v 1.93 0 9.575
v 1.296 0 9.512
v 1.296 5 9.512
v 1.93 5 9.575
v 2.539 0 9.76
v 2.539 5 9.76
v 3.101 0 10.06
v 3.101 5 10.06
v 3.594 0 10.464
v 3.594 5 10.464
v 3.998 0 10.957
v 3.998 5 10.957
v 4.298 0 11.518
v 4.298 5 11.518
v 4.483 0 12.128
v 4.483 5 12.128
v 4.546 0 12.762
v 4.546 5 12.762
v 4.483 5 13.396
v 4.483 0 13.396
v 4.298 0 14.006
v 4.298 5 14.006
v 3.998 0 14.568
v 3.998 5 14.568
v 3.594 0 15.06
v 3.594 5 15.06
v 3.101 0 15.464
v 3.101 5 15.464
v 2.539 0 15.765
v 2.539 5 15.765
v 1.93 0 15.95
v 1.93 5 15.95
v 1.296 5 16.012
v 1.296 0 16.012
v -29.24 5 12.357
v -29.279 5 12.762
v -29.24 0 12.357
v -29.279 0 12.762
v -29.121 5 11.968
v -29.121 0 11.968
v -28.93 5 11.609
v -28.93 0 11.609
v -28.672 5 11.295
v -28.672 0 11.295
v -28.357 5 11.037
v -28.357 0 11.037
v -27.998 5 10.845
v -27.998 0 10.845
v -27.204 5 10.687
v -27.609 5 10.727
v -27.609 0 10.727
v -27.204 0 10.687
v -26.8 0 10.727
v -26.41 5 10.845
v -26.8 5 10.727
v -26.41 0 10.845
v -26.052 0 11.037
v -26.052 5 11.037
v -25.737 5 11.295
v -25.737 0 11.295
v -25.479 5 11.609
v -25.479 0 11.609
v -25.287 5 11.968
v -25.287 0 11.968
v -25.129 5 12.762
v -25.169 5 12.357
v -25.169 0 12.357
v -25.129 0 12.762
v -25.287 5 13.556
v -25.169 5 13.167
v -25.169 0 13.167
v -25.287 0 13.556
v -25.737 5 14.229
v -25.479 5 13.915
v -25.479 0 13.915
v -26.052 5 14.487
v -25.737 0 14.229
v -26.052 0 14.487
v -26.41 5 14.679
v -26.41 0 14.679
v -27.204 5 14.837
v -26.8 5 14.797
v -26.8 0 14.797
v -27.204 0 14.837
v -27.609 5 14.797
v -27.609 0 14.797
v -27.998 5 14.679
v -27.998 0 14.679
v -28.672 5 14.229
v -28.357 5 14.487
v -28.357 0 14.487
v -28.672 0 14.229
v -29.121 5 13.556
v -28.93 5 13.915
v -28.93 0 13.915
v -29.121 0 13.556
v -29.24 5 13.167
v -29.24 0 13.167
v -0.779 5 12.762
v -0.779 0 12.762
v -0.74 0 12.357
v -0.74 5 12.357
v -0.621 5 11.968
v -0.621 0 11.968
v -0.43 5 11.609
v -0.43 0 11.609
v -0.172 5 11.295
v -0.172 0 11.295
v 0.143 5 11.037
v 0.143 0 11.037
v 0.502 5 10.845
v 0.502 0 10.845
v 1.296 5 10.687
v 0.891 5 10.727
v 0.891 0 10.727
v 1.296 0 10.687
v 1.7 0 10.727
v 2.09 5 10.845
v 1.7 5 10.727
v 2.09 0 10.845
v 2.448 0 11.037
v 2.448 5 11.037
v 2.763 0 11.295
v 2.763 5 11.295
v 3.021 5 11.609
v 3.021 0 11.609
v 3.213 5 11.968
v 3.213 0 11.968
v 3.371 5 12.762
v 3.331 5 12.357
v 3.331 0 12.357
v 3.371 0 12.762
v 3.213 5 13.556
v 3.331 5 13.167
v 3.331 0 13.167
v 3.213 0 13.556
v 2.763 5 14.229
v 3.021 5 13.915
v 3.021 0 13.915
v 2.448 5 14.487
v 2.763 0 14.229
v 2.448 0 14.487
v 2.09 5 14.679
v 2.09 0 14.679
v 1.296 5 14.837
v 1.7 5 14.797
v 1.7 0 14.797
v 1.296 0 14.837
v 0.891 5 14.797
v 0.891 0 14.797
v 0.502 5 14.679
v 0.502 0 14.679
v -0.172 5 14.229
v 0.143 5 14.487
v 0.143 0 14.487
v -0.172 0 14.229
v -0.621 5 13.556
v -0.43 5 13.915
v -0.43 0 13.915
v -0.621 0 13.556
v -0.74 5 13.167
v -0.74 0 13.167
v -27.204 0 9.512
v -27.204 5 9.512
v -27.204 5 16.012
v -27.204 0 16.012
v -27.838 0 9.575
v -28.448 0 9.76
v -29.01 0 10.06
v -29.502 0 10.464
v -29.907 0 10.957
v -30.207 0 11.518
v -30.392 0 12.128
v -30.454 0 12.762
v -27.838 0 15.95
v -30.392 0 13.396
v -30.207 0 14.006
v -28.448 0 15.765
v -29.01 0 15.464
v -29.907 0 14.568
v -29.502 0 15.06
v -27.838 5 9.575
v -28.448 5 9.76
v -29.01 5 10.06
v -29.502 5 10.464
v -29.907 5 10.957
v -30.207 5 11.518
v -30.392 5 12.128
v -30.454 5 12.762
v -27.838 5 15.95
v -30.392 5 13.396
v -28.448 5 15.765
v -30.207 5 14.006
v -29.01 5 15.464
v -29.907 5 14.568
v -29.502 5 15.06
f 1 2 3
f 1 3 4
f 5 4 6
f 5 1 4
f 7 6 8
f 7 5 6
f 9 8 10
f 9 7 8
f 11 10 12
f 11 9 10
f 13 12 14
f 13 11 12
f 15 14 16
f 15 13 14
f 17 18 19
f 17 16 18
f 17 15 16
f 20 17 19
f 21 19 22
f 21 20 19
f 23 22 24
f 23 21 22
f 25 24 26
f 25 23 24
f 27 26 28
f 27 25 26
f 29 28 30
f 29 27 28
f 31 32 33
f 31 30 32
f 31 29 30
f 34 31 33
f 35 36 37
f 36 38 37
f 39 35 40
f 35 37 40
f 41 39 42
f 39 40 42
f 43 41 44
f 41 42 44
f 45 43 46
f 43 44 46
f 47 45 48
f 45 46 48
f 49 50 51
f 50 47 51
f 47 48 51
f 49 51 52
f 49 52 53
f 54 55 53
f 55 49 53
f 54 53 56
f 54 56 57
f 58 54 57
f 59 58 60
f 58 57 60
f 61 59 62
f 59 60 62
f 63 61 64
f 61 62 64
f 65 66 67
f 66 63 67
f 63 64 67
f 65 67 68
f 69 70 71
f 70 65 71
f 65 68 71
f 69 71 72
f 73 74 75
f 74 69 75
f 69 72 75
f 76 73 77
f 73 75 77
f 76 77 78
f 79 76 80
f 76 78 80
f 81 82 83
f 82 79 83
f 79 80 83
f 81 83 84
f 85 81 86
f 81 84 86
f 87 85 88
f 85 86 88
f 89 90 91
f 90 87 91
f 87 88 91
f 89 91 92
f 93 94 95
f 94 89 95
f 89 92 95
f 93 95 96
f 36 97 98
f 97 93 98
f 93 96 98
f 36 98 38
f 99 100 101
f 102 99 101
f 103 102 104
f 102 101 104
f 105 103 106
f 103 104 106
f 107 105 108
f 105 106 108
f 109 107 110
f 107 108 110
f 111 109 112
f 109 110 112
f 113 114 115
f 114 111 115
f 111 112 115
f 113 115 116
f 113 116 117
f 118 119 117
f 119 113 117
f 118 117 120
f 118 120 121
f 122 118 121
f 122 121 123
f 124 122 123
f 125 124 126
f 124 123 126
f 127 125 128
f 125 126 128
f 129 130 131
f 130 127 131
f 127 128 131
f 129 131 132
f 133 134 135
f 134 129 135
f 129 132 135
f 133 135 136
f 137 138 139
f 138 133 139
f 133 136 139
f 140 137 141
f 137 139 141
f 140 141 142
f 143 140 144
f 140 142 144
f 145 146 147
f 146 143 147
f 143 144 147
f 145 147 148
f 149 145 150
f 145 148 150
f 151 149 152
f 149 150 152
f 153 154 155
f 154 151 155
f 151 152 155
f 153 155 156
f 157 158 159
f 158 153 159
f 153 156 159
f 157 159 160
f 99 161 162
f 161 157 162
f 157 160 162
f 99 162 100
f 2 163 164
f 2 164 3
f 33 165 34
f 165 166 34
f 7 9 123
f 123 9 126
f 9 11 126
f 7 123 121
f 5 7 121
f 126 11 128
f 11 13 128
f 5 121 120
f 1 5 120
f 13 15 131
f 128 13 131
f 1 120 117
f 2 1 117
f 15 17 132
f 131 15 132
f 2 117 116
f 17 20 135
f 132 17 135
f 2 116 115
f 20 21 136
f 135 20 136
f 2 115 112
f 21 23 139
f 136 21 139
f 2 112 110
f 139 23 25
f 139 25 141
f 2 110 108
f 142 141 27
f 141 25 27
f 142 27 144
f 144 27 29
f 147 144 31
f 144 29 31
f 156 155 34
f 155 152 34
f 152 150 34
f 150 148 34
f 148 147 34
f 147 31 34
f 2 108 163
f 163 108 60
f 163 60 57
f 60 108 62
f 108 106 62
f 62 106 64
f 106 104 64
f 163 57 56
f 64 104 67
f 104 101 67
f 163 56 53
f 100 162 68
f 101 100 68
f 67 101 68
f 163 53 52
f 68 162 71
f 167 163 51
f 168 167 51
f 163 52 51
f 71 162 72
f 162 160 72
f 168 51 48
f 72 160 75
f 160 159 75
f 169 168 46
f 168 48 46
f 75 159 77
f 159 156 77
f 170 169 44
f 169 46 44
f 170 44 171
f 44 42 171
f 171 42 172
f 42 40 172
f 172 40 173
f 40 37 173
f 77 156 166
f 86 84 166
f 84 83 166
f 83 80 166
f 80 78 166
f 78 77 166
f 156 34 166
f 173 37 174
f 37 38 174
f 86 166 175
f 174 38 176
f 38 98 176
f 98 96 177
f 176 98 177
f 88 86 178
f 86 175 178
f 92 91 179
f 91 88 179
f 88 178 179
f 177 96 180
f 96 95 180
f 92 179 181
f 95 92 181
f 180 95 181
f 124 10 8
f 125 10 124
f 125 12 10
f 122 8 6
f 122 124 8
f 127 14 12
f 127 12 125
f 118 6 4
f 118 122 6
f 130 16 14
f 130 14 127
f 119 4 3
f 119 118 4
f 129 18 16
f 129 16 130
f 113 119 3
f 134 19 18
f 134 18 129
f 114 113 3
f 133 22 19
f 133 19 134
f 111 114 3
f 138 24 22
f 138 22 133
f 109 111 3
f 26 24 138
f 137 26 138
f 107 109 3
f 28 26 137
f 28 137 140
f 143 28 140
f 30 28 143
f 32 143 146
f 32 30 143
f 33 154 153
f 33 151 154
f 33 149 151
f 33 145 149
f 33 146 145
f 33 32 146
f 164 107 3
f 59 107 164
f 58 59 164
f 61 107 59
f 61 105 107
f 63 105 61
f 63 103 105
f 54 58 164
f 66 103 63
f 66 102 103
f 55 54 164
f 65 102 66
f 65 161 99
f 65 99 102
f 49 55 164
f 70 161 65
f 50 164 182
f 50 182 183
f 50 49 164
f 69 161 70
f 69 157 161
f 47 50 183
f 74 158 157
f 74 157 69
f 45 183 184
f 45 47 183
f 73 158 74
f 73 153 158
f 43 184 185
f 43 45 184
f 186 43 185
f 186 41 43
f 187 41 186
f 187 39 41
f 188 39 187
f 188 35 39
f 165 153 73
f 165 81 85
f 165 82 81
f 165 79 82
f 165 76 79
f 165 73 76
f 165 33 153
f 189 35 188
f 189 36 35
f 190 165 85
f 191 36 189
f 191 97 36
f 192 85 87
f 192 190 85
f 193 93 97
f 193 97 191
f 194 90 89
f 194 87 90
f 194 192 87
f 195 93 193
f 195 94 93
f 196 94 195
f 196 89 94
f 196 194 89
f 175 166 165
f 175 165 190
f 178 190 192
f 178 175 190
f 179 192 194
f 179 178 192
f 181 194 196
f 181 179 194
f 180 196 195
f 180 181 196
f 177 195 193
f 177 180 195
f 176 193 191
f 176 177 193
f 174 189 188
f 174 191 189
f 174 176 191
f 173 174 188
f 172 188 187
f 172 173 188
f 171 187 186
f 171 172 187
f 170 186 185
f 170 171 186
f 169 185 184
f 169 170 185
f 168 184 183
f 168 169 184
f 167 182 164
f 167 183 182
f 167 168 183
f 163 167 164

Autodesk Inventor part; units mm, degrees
ref_plane "YZ Plane" through (0, 0, 0) normal (1, 0, 0) x (0, 1, 0)
ref_plane "XZ Plane" through (0, 0, 0) normal (0, 1, 0) x (-1, 0, 0)
ref_plane "XY Plane" through (0, 0, 0) normal (0, 0, 1) x (1, 0, 0)
sketch "Sketch1" plane through (0, 0, 0) normal (0, 1, 0) x (-1, 0, 0)
  circle A0 centre (27.2044, 12.7622) radius 2.075
  arc A1 (27.2044, 9.5122) -> (27.2044, 16.0122) centre (27.2044, 12.7622) ccw
  circle A2 centre (-1.2956, 12.7622) radius 2.075
  arc A3 (-1.2956, 16.0122) -> (-1.2956, 9.5122) centre (-1.2956, 12.7622) ccw
  line L0 (27.2044, 16.0122) -> (-1.2956, 16.0122)
  line L1 (27.2044, 9.5122) -> (-1.2956, 9.5122)
  point P0 (0, 0)
  dimension "d1" = 4.15
  dimension "d4" = 4.15
extrude "Extrusion1" add sketch "Sketch1" along normal blind 5
properties part number "innerBar"
